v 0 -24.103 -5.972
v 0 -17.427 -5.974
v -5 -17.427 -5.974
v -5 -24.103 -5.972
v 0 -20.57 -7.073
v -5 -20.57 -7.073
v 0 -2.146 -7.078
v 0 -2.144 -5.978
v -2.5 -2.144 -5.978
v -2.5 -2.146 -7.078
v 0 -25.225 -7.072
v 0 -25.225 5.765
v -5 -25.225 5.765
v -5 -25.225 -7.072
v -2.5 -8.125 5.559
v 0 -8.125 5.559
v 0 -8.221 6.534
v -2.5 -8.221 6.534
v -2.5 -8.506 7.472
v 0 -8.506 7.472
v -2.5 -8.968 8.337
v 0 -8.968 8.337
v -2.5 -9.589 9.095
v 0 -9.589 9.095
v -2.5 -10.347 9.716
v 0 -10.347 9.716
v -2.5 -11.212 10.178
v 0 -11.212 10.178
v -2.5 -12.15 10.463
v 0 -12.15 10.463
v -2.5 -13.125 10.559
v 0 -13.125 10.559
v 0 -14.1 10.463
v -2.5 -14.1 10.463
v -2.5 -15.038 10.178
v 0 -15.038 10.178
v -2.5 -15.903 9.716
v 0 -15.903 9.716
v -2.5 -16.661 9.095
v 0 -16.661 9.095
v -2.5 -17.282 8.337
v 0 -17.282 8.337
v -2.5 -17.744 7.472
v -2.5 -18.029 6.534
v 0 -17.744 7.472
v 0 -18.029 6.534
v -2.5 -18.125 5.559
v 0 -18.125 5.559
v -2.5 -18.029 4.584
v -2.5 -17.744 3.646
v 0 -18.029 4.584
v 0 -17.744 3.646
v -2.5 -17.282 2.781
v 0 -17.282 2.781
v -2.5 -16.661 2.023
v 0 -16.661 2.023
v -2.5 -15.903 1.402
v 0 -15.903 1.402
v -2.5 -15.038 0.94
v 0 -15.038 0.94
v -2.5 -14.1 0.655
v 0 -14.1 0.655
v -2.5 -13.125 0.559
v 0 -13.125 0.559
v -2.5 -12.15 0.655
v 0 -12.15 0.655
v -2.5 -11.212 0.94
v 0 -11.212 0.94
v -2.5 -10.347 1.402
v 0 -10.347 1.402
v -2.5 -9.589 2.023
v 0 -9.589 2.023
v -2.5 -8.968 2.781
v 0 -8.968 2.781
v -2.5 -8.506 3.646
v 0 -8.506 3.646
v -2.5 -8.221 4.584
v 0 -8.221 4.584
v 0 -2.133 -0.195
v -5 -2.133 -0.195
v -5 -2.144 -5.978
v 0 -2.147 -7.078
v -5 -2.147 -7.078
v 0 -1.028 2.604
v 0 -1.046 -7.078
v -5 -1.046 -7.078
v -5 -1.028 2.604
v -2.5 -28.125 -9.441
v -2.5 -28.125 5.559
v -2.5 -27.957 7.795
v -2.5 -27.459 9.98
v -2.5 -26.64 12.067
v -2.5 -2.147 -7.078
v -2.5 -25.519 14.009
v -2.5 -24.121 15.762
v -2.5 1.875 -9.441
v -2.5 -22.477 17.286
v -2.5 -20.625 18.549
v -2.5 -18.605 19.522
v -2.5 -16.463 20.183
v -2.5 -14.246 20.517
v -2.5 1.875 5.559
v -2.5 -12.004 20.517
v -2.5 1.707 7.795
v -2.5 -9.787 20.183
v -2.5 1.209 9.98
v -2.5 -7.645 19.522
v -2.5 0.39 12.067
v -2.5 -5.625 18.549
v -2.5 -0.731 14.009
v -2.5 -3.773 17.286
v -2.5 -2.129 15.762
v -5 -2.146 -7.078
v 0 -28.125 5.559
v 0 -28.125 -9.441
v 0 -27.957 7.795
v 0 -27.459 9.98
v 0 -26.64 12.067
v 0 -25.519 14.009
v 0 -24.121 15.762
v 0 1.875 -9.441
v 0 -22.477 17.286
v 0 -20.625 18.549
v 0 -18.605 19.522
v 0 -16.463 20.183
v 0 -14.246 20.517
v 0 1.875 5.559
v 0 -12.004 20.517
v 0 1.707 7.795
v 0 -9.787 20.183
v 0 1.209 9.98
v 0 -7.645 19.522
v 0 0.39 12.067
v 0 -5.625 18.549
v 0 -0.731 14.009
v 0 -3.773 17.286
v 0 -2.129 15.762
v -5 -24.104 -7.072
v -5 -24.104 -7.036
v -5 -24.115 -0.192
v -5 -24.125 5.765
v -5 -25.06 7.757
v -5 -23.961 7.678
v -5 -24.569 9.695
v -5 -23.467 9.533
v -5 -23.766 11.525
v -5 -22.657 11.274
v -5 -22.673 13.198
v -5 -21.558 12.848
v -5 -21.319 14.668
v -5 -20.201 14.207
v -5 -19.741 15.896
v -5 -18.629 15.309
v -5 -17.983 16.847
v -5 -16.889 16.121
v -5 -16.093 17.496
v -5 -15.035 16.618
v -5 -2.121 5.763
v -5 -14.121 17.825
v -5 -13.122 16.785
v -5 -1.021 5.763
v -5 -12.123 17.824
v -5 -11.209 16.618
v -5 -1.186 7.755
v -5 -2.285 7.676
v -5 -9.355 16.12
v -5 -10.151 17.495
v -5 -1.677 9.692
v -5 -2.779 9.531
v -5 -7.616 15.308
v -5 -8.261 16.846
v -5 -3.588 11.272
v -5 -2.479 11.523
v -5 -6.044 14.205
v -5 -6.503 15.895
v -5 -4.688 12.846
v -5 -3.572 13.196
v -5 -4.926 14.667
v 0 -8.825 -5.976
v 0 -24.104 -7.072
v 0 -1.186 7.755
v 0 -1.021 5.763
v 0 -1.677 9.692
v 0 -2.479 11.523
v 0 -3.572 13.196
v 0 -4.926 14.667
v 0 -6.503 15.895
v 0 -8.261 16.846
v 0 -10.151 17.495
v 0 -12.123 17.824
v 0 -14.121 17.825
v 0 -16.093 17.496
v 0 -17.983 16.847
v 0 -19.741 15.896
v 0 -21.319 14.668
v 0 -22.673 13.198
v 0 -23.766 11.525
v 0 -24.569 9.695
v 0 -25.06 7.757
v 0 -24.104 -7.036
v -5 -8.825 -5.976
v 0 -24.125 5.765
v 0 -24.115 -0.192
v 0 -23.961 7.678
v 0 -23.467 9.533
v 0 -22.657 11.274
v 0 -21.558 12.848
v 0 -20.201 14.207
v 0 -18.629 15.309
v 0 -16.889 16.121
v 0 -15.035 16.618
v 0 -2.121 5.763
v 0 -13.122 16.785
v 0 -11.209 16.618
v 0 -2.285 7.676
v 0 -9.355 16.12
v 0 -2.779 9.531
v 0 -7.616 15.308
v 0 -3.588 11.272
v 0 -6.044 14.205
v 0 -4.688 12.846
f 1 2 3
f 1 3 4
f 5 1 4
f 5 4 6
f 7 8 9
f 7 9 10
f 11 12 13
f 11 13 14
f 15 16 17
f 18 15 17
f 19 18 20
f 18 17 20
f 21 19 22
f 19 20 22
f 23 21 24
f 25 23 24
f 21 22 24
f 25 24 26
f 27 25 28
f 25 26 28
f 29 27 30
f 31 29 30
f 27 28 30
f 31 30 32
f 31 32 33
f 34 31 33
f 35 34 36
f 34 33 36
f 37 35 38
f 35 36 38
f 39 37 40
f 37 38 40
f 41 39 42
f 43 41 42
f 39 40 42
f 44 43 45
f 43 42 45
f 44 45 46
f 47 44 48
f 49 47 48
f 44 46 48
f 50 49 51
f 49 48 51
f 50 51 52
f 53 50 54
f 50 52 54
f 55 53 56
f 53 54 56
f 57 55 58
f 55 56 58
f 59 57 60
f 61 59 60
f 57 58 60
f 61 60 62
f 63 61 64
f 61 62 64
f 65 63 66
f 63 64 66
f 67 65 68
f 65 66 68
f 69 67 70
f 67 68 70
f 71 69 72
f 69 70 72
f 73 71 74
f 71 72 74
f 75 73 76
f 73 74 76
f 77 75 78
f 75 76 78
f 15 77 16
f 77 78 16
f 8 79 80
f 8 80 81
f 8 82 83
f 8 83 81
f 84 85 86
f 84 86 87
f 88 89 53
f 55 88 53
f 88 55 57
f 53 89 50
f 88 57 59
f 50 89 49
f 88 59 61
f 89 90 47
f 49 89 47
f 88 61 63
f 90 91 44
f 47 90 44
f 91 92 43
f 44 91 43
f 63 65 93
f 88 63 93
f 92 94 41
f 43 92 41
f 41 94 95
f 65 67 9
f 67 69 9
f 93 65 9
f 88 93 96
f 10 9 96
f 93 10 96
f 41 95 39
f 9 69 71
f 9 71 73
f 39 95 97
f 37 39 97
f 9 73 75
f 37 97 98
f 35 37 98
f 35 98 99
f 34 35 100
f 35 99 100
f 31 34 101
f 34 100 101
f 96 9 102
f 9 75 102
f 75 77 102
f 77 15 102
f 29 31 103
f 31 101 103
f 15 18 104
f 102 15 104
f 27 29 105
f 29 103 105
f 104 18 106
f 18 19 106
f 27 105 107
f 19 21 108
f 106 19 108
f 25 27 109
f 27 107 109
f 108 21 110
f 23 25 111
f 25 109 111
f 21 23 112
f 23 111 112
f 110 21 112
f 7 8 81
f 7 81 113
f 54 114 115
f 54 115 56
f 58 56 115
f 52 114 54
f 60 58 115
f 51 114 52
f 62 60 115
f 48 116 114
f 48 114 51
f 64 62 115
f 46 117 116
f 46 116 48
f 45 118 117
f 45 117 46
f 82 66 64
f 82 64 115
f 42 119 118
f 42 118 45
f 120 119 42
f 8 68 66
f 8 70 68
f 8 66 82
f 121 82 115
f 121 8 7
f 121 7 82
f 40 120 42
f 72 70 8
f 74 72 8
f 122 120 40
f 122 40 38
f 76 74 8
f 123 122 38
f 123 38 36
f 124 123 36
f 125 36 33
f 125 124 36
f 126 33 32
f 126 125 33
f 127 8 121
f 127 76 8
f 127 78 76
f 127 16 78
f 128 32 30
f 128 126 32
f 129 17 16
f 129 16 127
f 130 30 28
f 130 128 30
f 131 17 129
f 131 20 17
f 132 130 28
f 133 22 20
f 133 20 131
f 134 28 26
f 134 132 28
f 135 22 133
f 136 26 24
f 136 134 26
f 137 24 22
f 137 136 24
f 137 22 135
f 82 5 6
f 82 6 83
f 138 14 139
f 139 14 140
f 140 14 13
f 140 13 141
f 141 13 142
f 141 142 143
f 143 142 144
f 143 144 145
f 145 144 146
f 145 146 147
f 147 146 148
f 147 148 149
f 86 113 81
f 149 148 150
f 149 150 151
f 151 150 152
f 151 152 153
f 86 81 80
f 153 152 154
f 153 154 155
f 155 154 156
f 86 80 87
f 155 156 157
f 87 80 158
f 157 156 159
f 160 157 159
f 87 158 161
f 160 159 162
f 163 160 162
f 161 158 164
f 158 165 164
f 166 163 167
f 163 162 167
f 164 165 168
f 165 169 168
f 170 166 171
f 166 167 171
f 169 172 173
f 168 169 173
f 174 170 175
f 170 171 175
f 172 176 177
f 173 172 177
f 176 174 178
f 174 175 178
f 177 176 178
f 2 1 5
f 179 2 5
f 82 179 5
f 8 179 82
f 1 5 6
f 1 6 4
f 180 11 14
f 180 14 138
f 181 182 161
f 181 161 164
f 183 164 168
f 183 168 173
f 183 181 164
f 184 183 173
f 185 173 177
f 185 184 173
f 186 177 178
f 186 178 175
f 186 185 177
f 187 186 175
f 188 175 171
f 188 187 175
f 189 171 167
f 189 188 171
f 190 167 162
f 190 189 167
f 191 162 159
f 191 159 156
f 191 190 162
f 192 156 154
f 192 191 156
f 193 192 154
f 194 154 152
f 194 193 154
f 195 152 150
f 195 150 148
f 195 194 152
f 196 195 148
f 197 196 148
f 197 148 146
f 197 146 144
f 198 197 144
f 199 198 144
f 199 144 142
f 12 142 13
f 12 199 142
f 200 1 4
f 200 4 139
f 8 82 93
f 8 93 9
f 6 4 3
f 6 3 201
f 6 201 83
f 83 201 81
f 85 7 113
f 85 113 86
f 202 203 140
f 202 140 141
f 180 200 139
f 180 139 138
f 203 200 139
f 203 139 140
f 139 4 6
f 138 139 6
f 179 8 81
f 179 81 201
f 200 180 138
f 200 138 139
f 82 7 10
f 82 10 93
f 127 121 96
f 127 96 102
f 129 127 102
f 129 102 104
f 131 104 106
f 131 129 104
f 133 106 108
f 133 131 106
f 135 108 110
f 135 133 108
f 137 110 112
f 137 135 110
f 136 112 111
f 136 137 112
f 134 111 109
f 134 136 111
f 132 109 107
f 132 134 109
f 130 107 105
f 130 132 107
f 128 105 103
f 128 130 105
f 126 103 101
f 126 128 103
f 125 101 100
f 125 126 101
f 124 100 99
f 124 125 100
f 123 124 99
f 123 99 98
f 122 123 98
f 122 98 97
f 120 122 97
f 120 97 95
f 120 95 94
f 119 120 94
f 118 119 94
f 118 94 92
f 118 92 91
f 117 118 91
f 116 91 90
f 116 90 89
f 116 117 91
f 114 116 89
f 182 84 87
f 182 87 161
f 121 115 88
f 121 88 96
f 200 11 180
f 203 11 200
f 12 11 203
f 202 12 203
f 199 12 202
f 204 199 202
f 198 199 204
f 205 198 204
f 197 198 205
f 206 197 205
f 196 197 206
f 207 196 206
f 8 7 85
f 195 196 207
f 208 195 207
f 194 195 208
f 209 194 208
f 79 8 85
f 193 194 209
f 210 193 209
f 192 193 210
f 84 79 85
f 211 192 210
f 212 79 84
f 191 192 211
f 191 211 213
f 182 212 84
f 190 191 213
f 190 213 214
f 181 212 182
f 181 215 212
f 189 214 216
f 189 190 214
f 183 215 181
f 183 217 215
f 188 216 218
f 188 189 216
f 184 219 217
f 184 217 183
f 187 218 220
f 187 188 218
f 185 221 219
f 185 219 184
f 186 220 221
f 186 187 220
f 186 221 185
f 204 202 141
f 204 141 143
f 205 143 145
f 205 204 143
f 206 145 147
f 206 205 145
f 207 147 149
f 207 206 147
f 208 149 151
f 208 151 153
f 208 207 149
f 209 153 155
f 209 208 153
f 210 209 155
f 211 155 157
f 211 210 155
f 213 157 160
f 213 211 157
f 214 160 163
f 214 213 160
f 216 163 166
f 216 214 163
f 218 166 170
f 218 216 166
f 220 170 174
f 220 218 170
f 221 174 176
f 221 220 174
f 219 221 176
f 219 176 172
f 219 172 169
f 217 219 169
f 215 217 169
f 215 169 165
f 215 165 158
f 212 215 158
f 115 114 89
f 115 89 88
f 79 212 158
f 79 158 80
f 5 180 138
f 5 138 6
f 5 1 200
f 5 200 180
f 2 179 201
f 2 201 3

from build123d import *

# Parameters (mm, degrees)
F0_R     = 5
F1_DEPTH = 2.5
F2_DEPTH = 5
F3_DEPTH = 5


# Not quite as in the source:
# - a feature names something its author has since deleted; it is built from what else it names


with BuildPart() as f1:
    # F0 (on Right) → F1 (new body)
    with BuildSketch(Plane.YZ):
        with BuildLine():
            Line((1.875, -4.4410212704), (1.875, 5.5589787296))
            ThreePointArc((1.875, 5.5589787296), (-13.125, 20.5589787296), (-28.125, 5.5589787296))
            Line((-28.125, 5.5589787296), (-28.125, -9.4410212704))
            Line((-28.125, -9.4410212704), (1.875, -9.4410212704))
            Line((1.875, -9.4410212704), (1.875, -4.4410212704))
        make_face()
        with BuildLine():
            ThreePointArc((-0.6214854401, 5.7639283943), (-0.6214854576, 5.7632668705), (-0.6214855101, 5.7626053467))
            Line((-0.6214855101, 5.7626053467), (-0.6214855101, -7.441388098))
            Line((-0.6214855101, -7.441388098), (-1.0466333126, -7.4412858417))
            Line((-1.0466333126, -7.4412858417), (-2.1466328087, -7.4410212704))
            Line((-2.1466328087, -7.4410212704), (-24.1033577683, -7.4357402504))
            Line((-24.1033577683, -7.4357402504), (-25.2253250397, -7.4354703954))
            Line((-25.2253250397, -7.4354703954), (-25.6253250397, -7.4353741876))
            Line((-25.6253250397, -7.4353741876), (-25.6253250397, 5.7652514419))
            ThreePointArc((-25.6253250397, 5.7652514419), (-13.1227437511, 18.2658482116), (-0.6214854401, 5.7639283943))
        make_face(mode=Mode.SUBTRACT)
        with BuildLine():
            ThreePointArc((-8.825371599, -5.9759567979), (-4.9508229486, -3.6968800238), (-2.1328316515, -0.1947030957))
            Line((-2.1328316515, -0.1947030957), (-2.1214855101, 5.7626053467))
            ThreePointArc((-2.1214855101, 5.7626053467), (-13.1220798645, 16.7854966034), (-24.1253250397, 5.7652514419))
            Line((-24.1253250397, 5.7652514419), (-24.1154117036, -0.192059557))
            ThreePointArc((-24.1154117036, -0.192059557), (-21.2994002975, -3.6939309404), (-17.4270857953, -5.9738879181))
            Line((-17.4270857953, -5.9738879181), (-8.825371599, -5.9759567979))
        make_face()
        with Locations((-13.125, 5.5589787296)):
            Circle(F0_R, mode=Mode.SUBTRACT)
        with BuildLine():
            ThreePointArc((-25.2253250397, 2.6268061761), (-25.5250055228, 4.1833243656), (-25.6253249696, 5.7652514419))
            Line((-25.6253250397, 5.7652514419), (-25.6253250397, -7.4353741876))
            Line((-25.6253250397, -7.4353741876), (-25.2253250397, -7.4354703954))
            Line((-25.2253250397, -7.4354703954), (-25.2253250397, -7.0720094287))
            Line((-25.2253250397, -7.0720094287), (-25.2253250397, 2.6268061761))
        make_face()
        with BuildLine():
            Line((-2.1214855101, 5.7626053467), (-1.0214855101, 5.7626053467))
            ThreePointArc((-1.0214855101, 5.7626053467), (-13.1220822273, 17.8658481591), (-25.2253250397, 5.7652514419))
            Line((-25.2253250397, 5.7652514419), (-24.1253250397, 5.7652514419))
            ThreePointArc((-24.1253250397, 5.7652514419), (-13.1220798645, 16.7854966034), (-2.1214855101, 5.7626053467))
        make_face()
        with BuildLine():
            Line((-1.0214855101, 5.7626053467), (-0.6214855101, 5.7626053467))
            ThreePointArc((-0.6214855101, 5.7626053467), (-0.6214854576, 5.7632668705), (-0.6214854401, 5.7639283943))
            ThreePointArc((-0.6214854401, 5.7639283943), (-13.1227437511, 18.2658482116), (-25.6253250397, 5.7652514419))
            Line((-25.6253250397, 5.7652514419), (-25.2253250397, 5.7652514419))
            ThreePointArc((-25.2253250397, 5.7652514419), (-13.1220822273, 17.8658481591), (-1.0214855101, 5.7626053467))
        make_face()
        with BuildLine():
            Line((-25.2253250397, 5.7652514419), (-25.6253250397, 5.7652514419))
            ThreePointArc((-25.6253249696, 5.7652514419), (-25.5250055228, 4.1833243656), (-25.2253250397, 2.6268061761))
            Line((-25.2253250397, 2.6268061761), (-25.2253250397, 5.7652514419))
        make_face()
        with BuildLine():
            Line((-24.1253250397, 5.7652514419), (-25.2253250397, 5.7652514419))
            Line((-25.2253250397, 5.7652514419), (-25.2253250397, 2.6268061761))
            ThreePointArc((-25.2253250397, 2.6268061761), (-24.7560686742, 1.1836292728), (-24.1154117036, -0.192059557))
            Line((-24.1154117036, -0.192059557), (-24.1253250397, 5.7652514419))
        make_face()
        Polygon((-24.1033577683, -7.4357402504), (-2.1466328087, -7.4410212704), (-2.1459405703, -7.0775604702), (-2.1466328087, -7.0775603037), (-20.5701562872, -7.0731290875), (-24.1039625902, -7.0722791382), align=None)
        Polygon((-24.1033577683, -5.9722821446), (-24.1040233922, -7.0357408042), (-24.1039625902, -7.0722791382), (-20.5701562872, -7.0731290875), align=None)
        with BuildLine():
            ThreePointArc((-17.4270857953, -5.9738879181), (-13.12641223, -6.7379910088), (-8.825371599, -5.9759567979))
            Line((-8.825371599, -5.9759567979), (-17.4270857953, -5.9738879181))
        make_face()
        Polygon((-25.2253250397, -7.0720094287), (-25.2253250397, -7.4354703954), (-24.1033577683, -7.4357402504), (-24.1039625902, -7.0722791382), align=None)
        with BuildLine():
            ThreePointArc((-24.1154117036, -0.192059557), (-24.7560686742, 1.1836292728), (-25.2253250397, 2.6268061761))
            Line((-25.2253250397, 2.6268061761), (-25.2253250397, -7.0720094287))
            Line((-25.2253250397, -7.0720094287), (-24.1039625902, -7.0722791382))
            Line((-24.1039625902, -7.0722791382), (-24.1040233922, -7.0357408042))
            Line((-24.1040233922, -7.0357408042), (-24.1154117036, -0.192059557))
        make_face()
        with BuildLine():
            Line((-0.6214855101, -7.441388098), (-0.6214855101, 5.7626053467))
            ThreePointArc((-0.6214855801, 5.7626053467), (-0.7234893636, 4.1701645483), (-1.0275019055, 2.6036879789))
            Line((-1.0275019055, 2.6036879789), (-1.0459410742, -7.0778250415))
            Line((-1.0459410742, -7.0778250415), (-1.0466333126, -7.4412858417))
            Line((-1.0466333126, -7.4412858417), (-0.6214855101, -7.441388098))
        make_face()
        with BuildLine():
            ThreePointArc((-1.0275019055, 2.6036879789), (-0.7234893636, 4.1701645483), (-0.6214855801, 5.7626053467))
            Line((-0.6214855101, 5.7626053467), (-1.0214855101, 5.7626053467))
            Line((-1.0214855101, 5.7626053467), (-1.0275019055, 2.6036879789))
        make_face()
        with BuildLine():
            ThreePointArc((-2.1328316515, -0.1947030957), (-1.495675353, 1.1711193771), (-1.0275019055, 2.6036879789))
            Line((-1.0275019055, 2.6036879789), (-1.0214855101, 5.7626053467))
            Line((-1.0214855101, 5.7626053467), (-2.1214855101, 5.7626053467))
            Line((-2.1214855101, 5.7626053467), (-2.1328316515, -0.1947030957))
        make_face()
        with BuildLine():
            Line((-1.0459410742, -7.0778250415), (-1.0275019055, 2.6036879789))
            ThreePointArc((-1.0275019055, 2.6036879789), (-1.495675353, 1.1711193771), (-2.1328316515, -0.1947030957))
            Line((-2.1328316515, -0.1947030957), (-2.1438455441, -5.977563835))
            Line((-2.1438455441, -5.977563835), (-2.1459405703, -7.0775604702))
            Line((-2.1459405703, -7.0775604702), (-1.0459410742, -7.0778250415))
        make_face()
        with BuildLine():
            Line((-2.1438455441, -5.977563835), (-2.1328316515, -0.1947030957))
            ThreePointArc((-2.1328316515, -0.1947030957), (-4.9508229486, -3.6968800238), (-8.825371599, -5.9759567979))
            Line((-8.825371599, -5.9759567979), (-2.1438455441, -5.977563835))
        make_face()
        Polygon((-2.1466328087, -7.4410212704), (-1.0466333126, -7.4412858417), (-1.0459410742, -7.0778250415), (-2.1459405703, -7.0775604702), align=None)
        with BuildLine():
            ThreePointArc((-17.4270857953, -5.9738879181), (-21.2994002975, -3.6939309404), (-24.1154117036, -0.192059557))
            Line((-24.1154117036, -0.192059557), (-24.1040233922, -7.0357408042))
            Line((-24.1040233922, -7.0357408042), (-24.1033577683, -5.9722821446))
            Line((-24.1033577683, -5.9722821446), (-17.4270857953, -5.9738879181))
        make_face()
        Polygon((-20.5701562872, -7.0731290875), (-17.4270857953, -5.9738879181), (-24.1033577683, -5.9722821446), align=None)
        with BuildLine():
            Line((-2.1438455441, -5.977563835), (-8.825371599, -5.9759567979))
            ThreePointArc((-8.825371599, -5.9759567979), (-13.12641223, -6.7379910088), (-17.4270857953, -5.9738879181))
            Line((-17.4270857953, -5.9738879181), (-20.5701562872, -7.0731290875))
            Line((-20.5701562872, -7.0731290875), (-2.1466328087, -7.0775603037))
            Line((-2.1466328087, -7.0775603037), (-2.1438455441, -5.977563835))
        make_face()
    extrude(amount=-F1_DEPTH)


with BuildPart() as f2:
    # F0 (on Right) → F2 (new body)
    with BuildSketch(Plane.YZ):
        with BuildLine():
            Line((-24.1253250397, 5.7652514419), (-25.2253250397, 5.7652514419))
            Line((-25.2253250397, 5.7652514419), (-25.2253250397, 2.6268061761))
            ThreePointArc((-25.2253250397, 2.6268061761), (-24.7560686742, 1.1836292728), (-24.1154117036, -0.192059557))
            Line((-24.1154117036, -0.192059557), (-24.1253250397, 5.7652514419))
        make_face()
        with BuildLine():
            Line((-2.1214855101, 5.7626053467), (-1.0214855101, 5.7626053467))
            ThreePointArc((-1.0214855101, 5.7626053467), (-13.1220822273, 17.8658481591), (-25.2253250397, 5.7652514419))
            Line((-25.2253250397, 5.7652514419), (-24.1253250397, 5.7652514419))
            ThreePointArc((-24.1253250397, 5.7652514419), (-13.1220798645, 16.7854966034), (-2.1214855101, 5.7626053467))
        make_face()
        with BuildLine():
            ThreePointArc((-2.1328316515, -0.1947030957), (-1.495675353, 1.1711193771), (-1.0275019055, 2.6036879789))
            Line((-1.0275019055, 2.6036879789), (-1.0214855101, 5.7626053467))
            Line((-1.0214855101, 5.7626053467), (-2.1214855101, 5.7626053467))
            Line((-2.1214855101, 5.7626053467), (-2.1328316515, -0.1947030957))
        make_face()
        with BuildLine():
            Line((-1.0459410742, -7.0778250415), (-1.0275019055, 2.6036879789))
            ThreePointArc((-1.0275019055, 2.6036879789), (-1.495675353, 1.1711193771), (-2.1328316515, -0.1947030957))
            Line((-2.1328316515, -0.1947030957), (-2.1438455441, -5.977563835))
            Line((-2.1438455441, -5.977563835), (-2.1459405703, -7.0775604702))
            Line((-2.1459405703, -7.0775604702), (-1.0459410742, -7.0778250415))
        make_face()
        with BuildLine():
            ThreePointArc((-24.1154117036, -0.192059557), (-24.7560686742, 1.1836292728), (-25.2253250397, 2.6268061761))
            Line((-25.2253250397, 2.6268061761), (-25.2253250397, -7.0720094287))
            Line((-25.2253250397, -7.0720094287), (-24.1039625902, -7.0722791382))
            Line((-24.1039625902, -7.0722791382), (-24.1040233922, -7.0357408042))
            Line((-24.1040233922, -7.0357408042), (-24.1154117036, -0.192059557))
        make_face()
    extrude(amount=-F2_DEPTH)


with BuildPart() as f2b:
    # F0 (on Right) → F2, piece 2 (new body)
    with BuildSketch(Plane.YZ):
        with BuildLine():
            ThreePointArc((-17.4270857953, -5.9738879181), (-13.12641223, -6.7379910088), (-8.825371599, -5.9759567979))
            Line((-8.825371599, -5.9759567979), (-17.4270857953, -5.9738879181))
        make_face()
        Polygon((-20.5701562872, -7.0731290875), (-17.4270857953, -5.9738879181), (-24.1033577683, -5.9722821446), align=None)
        with BuildLine():
            Line((-2.1438455441, -5.977563835), (-8.825371599, -5.9759567979))
            ThreePointArc((-8.825371599, -5.9759567979), (-13.12641223, -6.7379910088), (-17.4270857953, -5.9738879181))
            Line((-17.4270857953, -5.9738879181), (-20.5701562872, -7.0731290875))
            Line((-20.5701562872, -7.0731290875), (-2.1466328087, -7.0775603037))
            Line((-2.1466328087, -7.0775603037), (-2.1438455441, -5.977563835))
        make_face()
    extrude(amount=-F2_DEPTH)


with BuildPart() as f3:
    # F0 (on Right) → F3 (new body)
    with BuildSketch(Plane.YZ):
        Polygon((-24.1033577683, -5.9722821446), (-24.1040233922, -7.0357408042), (-24.1039625902, -7.0722791382), (-20.5701562872, -7.0731290875), align=None)
    extrude(amount=-F3_DEPTH)


solid = Compound([f1.part, f2.part, f2b.part, f3.part])
